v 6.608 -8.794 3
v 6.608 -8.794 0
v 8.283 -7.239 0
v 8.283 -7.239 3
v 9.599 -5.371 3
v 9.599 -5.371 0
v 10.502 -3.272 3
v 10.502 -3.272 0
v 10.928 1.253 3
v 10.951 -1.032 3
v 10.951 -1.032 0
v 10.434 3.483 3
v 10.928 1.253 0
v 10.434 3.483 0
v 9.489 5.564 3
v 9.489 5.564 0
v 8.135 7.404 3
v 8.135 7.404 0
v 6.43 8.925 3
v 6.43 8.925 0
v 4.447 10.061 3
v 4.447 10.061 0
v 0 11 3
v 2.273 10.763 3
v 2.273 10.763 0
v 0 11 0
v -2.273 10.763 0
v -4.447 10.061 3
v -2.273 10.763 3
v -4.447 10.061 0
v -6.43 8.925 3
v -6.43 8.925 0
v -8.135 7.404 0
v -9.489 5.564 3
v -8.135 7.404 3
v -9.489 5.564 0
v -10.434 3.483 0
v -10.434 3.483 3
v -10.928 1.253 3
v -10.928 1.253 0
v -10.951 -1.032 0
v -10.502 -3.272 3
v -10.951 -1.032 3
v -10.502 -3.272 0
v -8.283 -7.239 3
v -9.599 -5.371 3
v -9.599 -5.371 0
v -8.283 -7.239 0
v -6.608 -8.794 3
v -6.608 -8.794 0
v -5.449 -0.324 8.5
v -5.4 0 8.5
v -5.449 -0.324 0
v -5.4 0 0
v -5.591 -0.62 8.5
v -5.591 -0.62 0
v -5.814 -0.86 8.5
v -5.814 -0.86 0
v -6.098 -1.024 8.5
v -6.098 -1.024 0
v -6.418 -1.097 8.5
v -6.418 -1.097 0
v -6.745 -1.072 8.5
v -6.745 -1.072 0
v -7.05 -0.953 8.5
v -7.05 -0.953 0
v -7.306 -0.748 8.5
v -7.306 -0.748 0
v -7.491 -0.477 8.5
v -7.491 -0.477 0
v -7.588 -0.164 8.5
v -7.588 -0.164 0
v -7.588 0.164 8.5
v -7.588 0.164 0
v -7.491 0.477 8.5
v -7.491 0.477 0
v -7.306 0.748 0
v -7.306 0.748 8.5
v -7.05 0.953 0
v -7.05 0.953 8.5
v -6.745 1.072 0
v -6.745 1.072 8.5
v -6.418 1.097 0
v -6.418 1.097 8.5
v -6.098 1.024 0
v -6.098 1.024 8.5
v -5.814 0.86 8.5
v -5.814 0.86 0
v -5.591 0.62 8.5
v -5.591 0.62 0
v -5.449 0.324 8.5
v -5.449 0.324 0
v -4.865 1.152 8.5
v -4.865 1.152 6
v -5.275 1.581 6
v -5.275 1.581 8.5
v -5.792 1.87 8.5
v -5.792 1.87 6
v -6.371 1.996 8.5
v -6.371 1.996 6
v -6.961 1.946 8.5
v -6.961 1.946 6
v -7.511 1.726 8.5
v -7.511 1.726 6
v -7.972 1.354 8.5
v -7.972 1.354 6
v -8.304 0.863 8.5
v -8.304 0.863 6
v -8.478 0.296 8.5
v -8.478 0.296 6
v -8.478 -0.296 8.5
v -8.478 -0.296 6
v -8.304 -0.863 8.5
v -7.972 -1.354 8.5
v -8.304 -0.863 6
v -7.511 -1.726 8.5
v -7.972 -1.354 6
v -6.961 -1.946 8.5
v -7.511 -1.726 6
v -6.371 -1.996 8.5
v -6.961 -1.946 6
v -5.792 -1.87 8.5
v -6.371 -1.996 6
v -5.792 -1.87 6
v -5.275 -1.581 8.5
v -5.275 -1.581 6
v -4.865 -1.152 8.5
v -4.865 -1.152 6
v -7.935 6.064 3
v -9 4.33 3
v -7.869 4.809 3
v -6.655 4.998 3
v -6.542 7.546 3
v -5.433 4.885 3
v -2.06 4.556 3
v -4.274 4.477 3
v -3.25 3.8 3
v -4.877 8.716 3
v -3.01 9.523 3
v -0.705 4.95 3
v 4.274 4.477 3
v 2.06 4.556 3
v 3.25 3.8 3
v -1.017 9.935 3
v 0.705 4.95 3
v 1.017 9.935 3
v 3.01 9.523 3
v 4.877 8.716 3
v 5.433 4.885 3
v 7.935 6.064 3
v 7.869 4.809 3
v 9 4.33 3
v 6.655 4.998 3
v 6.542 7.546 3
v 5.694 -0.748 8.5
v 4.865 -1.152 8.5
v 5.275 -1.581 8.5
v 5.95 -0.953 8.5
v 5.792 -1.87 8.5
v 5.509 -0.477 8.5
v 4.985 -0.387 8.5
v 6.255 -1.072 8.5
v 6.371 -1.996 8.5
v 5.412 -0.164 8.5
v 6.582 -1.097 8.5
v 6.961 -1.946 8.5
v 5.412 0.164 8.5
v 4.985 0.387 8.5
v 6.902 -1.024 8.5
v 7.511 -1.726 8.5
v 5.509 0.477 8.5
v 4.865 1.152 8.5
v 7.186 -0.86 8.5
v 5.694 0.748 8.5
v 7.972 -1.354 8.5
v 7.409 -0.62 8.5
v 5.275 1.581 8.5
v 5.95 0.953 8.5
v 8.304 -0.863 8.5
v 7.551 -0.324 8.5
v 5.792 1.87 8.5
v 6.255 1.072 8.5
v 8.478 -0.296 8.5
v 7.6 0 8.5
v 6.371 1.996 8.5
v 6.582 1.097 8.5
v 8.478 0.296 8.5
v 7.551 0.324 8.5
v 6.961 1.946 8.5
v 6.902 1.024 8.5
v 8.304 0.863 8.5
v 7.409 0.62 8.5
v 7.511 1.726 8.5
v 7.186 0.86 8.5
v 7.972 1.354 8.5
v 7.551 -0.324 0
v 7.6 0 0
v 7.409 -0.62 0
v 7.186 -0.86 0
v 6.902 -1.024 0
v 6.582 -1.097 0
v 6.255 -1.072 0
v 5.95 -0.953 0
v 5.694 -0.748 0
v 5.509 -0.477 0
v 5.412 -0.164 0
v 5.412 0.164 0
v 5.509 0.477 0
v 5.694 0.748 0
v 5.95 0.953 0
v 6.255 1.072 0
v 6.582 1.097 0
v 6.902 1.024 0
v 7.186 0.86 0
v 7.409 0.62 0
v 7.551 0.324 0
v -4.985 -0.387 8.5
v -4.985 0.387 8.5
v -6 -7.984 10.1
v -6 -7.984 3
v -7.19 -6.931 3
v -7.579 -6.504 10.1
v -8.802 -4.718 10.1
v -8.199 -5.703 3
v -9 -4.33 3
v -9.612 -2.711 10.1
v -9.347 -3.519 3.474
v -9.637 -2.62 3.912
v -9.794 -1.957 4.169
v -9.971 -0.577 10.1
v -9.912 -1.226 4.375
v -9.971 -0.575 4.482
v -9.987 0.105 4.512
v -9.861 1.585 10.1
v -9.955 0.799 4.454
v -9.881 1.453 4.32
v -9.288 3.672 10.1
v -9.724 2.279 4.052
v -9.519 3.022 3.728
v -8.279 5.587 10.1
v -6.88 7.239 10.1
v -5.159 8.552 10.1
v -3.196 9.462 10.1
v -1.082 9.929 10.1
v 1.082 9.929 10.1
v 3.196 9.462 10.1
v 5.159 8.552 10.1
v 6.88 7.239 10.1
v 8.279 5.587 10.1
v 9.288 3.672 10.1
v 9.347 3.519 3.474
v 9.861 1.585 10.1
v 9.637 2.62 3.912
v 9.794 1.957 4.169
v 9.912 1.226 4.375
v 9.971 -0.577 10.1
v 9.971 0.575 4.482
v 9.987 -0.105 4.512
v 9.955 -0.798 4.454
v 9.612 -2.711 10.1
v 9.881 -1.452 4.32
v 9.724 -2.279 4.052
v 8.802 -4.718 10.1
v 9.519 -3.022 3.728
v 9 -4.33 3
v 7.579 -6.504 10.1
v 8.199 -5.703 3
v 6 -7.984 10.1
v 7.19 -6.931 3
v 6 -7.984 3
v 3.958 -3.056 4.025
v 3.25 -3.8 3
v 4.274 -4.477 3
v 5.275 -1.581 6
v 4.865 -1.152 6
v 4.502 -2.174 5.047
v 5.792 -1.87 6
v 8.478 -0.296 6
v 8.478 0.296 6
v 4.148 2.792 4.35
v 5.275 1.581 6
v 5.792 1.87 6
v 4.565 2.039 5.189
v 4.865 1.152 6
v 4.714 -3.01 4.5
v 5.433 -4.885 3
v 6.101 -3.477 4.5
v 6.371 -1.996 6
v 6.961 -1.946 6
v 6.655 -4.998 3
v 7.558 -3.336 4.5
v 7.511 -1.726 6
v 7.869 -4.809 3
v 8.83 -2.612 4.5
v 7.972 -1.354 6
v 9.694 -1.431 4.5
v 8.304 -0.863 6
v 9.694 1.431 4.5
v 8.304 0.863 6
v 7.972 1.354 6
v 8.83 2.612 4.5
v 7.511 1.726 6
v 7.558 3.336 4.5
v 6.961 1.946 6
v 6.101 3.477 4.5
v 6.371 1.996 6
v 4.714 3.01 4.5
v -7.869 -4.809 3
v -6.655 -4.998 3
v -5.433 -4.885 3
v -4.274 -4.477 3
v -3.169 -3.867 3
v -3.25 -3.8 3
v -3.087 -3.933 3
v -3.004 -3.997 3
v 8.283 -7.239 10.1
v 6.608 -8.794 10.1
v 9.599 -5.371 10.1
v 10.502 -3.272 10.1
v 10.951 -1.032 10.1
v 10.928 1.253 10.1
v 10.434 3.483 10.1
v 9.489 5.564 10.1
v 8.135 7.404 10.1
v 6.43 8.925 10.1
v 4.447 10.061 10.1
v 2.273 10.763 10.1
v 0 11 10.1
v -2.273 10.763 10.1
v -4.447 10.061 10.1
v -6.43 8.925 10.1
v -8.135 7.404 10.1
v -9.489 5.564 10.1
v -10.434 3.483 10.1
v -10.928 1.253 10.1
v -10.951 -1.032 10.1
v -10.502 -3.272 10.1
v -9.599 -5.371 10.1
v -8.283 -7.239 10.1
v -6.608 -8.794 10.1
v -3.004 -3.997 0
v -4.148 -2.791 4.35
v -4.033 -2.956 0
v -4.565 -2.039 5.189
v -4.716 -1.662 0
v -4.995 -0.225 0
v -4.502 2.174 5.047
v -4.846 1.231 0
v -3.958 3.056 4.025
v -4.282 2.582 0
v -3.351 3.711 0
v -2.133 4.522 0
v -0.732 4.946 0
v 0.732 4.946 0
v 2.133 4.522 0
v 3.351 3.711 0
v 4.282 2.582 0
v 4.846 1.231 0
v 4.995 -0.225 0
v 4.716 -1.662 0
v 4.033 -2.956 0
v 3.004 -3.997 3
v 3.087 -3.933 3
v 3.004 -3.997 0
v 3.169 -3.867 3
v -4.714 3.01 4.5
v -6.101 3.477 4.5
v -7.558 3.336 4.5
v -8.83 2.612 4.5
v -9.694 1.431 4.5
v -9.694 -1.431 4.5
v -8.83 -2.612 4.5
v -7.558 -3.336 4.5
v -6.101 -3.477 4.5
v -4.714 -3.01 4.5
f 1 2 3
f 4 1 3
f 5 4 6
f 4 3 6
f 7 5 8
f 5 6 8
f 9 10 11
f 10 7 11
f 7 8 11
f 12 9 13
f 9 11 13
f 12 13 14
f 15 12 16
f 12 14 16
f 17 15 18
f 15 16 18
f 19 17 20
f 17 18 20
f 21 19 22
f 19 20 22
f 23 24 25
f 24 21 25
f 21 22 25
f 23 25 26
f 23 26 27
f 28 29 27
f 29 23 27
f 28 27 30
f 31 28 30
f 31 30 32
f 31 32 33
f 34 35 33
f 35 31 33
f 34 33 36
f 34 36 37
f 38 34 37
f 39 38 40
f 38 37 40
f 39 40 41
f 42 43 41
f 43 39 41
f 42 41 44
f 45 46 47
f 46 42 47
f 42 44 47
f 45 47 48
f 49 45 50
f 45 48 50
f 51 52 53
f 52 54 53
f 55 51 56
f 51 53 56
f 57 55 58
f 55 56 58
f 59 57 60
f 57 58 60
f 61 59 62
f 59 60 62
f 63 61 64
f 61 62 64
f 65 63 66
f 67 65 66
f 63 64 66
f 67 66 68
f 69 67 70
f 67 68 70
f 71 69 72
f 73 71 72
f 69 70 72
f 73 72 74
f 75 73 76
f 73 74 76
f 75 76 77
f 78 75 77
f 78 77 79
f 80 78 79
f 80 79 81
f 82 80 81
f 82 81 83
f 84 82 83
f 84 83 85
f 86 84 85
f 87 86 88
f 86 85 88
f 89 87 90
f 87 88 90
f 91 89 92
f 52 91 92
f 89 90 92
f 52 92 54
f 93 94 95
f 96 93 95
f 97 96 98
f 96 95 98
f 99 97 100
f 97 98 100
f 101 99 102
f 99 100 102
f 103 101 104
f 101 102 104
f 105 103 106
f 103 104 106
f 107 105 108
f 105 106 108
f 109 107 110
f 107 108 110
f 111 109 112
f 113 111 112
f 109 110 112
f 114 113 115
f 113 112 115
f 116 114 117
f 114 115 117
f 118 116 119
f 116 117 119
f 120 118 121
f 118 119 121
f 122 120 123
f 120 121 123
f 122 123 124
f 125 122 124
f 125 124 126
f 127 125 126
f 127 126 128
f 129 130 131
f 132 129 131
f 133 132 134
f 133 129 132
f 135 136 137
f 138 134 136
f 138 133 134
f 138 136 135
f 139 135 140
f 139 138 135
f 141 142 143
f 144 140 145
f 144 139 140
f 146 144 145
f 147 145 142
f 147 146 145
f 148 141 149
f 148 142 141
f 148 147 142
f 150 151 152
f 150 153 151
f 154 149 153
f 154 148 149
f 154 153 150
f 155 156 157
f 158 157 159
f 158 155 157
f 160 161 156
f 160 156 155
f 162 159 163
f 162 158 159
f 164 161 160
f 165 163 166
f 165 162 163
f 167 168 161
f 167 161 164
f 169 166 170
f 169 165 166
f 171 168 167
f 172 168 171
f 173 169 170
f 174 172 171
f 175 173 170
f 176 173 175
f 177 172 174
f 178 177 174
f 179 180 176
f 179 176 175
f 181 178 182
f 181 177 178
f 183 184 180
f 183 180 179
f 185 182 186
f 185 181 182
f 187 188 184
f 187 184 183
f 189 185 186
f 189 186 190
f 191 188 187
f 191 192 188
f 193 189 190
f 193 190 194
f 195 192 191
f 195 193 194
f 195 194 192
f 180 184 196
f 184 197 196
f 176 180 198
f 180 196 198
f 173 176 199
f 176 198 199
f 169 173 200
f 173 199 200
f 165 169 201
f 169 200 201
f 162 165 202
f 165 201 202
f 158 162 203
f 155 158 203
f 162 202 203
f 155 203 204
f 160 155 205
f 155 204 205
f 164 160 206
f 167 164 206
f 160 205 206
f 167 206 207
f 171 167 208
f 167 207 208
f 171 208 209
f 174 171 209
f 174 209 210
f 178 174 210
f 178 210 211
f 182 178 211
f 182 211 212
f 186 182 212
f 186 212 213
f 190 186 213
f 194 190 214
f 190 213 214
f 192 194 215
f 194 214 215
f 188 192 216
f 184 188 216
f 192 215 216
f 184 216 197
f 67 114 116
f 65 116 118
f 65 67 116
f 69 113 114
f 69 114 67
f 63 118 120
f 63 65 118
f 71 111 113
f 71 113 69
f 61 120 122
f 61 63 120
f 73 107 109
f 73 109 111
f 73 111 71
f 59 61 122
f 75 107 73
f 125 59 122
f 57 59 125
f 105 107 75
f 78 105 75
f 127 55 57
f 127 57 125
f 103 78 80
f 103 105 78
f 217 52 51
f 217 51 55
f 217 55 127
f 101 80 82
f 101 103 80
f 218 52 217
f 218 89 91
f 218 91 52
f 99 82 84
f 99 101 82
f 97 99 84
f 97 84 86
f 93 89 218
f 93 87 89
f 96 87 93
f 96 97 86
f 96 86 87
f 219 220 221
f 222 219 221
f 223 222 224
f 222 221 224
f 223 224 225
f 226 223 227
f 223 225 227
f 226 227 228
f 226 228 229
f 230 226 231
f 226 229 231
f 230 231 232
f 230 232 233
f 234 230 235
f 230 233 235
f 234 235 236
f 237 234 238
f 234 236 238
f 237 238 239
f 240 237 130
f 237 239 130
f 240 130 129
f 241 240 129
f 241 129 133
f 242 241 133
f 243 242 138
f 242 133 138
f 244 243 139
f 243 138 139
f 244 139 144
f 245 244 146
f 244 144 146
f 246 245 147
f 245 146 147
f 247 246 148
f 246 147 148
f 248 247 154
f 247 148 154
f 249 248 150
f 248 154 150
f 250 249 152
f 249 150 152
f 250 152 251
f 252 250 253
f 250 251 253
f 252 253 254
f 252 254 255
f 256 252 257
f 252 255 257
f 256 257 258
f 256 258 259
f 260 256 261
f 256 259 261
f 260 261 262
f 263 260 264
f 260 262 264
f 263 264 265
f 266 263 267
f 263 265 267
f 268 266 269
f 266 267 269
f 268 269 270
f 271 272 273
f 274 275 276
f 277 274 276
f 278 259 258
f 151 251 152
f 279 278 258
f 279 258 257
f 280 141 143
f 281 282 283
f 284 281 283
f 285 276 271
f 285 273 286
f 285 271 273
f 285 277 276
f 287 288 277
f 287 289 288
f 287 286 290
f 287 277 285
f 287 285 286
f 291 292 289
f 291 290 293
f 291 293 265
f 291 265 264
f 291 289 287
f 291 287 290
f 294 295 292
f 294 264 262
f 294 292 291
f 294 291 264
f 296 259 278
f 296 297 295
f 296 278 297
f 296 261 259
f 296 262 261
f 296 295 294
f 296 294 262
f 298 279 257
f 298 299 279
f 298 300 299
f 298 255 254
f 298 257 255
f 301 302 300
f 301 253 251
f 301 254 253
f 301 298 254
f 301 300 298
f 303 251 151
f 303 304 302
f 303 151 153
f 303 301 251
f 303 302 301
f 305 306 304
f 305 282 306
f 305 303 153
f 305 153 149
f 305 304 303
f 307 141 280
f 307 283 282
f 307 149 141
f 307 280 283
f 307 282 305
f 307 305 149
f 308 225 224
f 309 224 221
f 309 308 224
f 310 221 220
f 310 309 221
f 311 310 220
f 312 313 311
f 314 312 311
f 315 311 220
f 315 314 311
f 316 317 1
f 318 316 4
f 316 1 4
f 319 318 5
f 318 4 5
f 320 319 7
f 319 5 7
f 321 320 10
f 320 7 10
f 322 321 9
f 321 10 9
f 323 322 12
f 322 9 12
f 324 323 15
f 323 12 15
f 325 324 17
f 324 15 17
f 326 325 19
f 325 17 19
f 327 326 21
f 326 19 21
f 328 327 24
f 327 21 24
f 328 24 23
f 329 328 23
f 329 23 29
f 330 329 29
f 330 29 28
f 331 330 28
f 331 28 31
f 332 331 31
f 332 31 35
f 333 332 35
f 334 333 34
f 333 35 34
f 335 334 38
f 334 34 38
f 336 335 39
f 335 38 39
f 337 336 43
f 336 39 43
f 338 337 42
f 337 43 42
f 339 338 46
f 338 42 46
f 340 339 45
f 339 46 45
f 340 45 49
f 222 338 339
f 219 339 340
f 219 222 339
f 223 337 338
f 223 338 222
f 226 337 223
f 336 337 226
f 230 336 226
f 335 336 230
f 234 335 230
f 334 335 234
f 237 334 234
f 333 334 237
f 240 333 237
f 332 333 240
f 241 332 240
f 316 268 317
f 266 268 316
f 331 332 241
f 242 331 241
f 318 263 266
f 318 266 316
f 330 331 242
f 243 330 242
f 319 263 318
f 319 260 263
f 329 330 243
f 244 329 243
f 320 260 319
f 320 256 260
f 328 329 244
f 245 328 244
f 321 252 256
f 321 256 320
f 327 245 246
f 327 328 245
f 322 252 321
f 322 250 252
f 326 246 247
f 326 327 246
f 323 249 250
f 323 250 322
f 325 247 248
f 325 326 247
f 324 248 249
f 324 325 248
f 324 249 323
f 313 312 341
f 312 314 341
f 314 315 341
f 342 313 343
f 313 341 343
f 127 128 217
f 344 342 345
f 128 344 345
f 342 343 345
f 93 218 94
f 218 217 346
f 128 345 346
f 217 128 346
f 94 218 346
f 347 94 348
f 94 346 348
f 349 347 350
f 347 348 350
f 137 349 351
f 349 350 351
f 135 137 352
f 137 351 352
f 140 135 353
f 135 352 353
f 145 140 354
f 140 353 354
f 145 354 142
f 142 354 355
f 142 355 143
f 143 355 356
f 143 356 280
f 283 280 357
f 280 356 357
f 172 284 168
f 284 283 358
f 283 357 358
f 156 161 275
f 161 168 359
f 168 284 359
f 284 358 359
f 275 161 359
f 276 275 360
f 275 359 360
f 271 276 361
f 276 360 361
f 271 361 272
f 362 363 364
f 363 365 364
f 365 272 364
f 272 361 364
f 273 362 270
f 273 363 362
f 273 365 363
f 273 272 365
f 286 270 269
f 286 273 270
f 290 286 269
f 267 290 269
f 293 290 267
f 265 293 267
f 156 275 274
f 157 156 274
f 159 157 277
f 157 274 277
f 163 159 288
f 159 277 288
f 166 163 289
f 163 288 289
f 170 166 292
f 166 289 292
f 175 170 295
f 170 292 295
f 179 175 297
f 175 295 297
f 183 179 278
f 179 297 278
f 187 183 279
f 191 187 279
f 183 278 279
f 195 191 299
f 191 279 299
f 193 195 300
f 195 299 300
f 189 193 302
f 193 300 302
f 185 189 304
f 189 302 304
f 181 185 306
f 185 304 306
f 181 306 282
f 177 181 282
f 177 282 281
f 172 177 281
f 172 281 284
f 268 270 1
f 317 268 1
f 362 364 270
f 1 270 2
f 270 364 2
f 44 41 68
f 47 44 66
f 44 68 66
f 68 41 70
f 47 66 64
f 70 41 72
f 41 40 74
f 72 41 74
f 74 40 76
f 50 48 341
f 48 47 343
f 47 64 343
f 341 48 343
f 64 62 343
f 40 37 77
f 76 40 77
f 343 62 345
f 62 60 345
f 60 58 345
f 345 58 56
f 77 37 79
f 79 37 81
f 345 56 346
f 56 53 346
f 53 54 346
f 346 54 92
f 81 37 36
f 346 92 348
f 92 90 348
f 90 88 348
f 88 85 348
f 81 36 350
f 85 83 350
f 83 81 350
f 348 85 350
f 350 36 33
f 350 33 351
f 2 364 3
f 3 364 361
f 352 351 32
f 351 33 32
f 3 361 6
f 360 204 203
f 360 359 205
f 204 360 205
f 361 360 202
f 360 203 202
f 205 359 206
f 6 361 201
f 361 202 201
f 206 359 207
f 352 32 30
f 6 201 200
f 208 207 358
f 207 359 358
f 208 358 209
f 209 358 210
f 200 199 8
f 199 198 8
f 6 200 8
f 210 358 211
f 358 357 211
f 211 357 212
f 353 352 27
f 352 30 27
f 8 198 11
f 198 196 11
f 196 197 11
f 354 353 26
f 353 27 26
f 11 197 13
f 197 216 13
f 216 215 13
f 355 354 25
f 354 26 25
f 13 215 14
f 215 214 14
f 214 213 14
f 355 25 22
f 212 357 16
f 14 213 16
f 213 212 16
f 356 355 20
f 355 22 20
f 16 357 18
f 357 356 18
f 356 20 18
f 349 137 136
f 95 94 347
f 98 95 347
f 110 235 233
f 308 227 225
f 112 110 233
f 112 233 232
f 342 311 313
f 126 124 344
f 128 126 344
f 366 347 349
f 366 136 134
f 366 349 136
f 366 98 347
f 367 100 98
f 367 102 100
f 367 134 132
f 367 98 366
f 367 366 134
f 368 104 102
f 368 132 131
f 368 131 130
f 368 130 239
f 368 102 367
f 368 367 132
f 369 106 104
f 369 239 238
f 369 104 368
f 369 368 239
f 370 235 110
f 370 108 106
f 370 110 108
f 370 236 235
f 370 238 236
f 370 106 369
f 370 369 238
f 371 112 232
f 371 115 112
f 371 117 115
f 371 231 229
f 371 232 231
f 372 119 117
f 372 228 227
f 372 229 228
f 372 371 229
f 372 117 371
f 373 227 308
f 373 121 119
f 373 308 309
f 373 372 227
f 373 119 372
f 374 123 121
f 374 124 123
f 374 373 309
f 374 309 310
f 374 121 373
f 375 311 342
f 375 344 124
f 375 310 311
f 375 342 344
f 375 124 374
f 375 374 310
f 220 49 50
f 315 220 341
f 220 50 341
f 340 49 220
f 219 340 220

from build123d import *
from build123d.topology import SkipClean

# Parameters (mm, degrees)
SKETCH_1_R          = 11
SKETCH_1_R_2        = 5
SKETCH_1_R_3        = 1.1
EXTRUDE_1_DEPTH     = 3
EXTRUDE_2_DEPTH     = 5.5
EXTRUDE_3_DEPTH     = 7.1
CHAMFER_1_SIZE      = 3
CUT_EXTRUDE_1_DEPTH = 10
CUT_EXTRUDE_2_REACH = 19.1
SKETCH_5_R          = 1.1


with BuildPart() as part:
    # 草图1 → 凸台-拉伸1 (new body)
    with BuildSketch(Plane.XY):
        Circle(SKETCH_1_R)
        Circle(SKETCH_1_R_2, mode=Mode.SUBTRACT)
        with Locations((-6.5, 0)):
            Circle(SKETCH_1_R_3, mode=Mode.SUBTRACT)
        with Locations((6.5, 0)):
            Circle(SKETCH_1_R_3, mode=Mode.SUBTRACT)
    extrude(amount=EXTRUDE_1_DEPTH)

    # 草图2 → 凸台-拉伸2 (add)
    with SkipClean():  # the faces are left unmerged after this step: merging them gives an invalid solid
        with BuildSketch(Plane.XY.offset(3)):
            with BuildLine():
                ThreePointArc((4.865384615, -1.152402944), (8.5, 0), (4.865384615, 1.152402944))
                ThreePointArc((4.865384615, 1.152402944), (5, 0), (4.865384615, -1.152402944))
            make_face()
            with BuildLine():
                ThreePointArc((-4.865384615, 1.152402944), (-8.5, 0), (-4.865384615, -1.152402944))
                ThreePointArc((-4.865384615, -1.152402944), (-5, 0), (-4.865384615, 1.152402944))
            make_face()
        extrude(amount=EXTRUDE_2_DEPTH)

    # 草图3 → 凸台-拉伸3 (add)
    with SkipClean():  # the faces are left unmerged after this step: merging them gives an invalid solid
        with BuildSketch(Plane.XY.offset(3)):
            with BuildLine():
                Line((-6.60837923, -8.79370934), (-6, -7.984144705))
                ThreePointArc((-6, -7.984144705), (0, 9.987320295), (6, -7.984144705))
                Line((6, -7.984144705), (6.60837923, -8.79370934))
                ThreePointArc((6.60837923, -8.79370934), (0, 11), (-6.60837923, -8.79370934))
            make_face()
        extrude(amount=EXTRUDE_3_DEPTH)

    # 倒角1
    # the kernel refuses this chamfer: 3 mm, written as the material it adds along each edge
    with BuildSketch(Plane(origin=(6.5, 0, 3), x_dir=(-0.9999950652018583, -0.0031415874858795587, 0), z_dir=(-0.0031415874858795587, 0.9999950652018583, 0))) as chamfer_1_piece_1_section:
        Polygon((2 + CHAMFER_1_SIZE, 0), (2, CHAMFER_1_SIZE), (2, 0), align=None)
    chamfer_1_piece_1 = revolve(axis=Axis((6.5, 0, 3), (0, 0, 1)), revolution_arc=359.64, mode=Mode.PRIVATE)
    chamfer_1_piece_1 = chamfer_1_piece_1 - Plane(origin=(0, 0, 3.47273438), x_dir=(1, 0, 0), z_dir=(0, 0, -1)) * Cylinder(5, 21, mode=Mode.PRIVATE)
    chamfer_1_piece_1 = chamfer_1_piece_1 & Plane(origin=(0, 0, 3.47273438), x_dir=(-0.6007617481958082, -0.7994281217875167, 0), z_dir=(0, 0, -1)) * Cylinder(9.987320295, 21, mode=Mode.PRIVATE)
    add(chamfer_1_piece_1)
    with BuildSketch(Plane(origin=(-6.5, 0, 3), x_dir=(0.9999950652018583, 0.0031415874858795045, 0), z_dir=(0.0031415874858795045, -0.9999950652018583, 0))) as chamfer_1_piece_2_section:
        Polygon((2 + CHAMFER_1_SIZE, 0), (2, CHAMFER_1_SIZE), (2, 0), align=None)
    chamfer_1_piece_2 = revolve(axis=Axis((-6.5, 0, 3), (0, 0, 1)), revolution_arc=359.64, mode=Mode.PRIVATE)
    chamfer_1_piece_2 = chamfer_1_piece_2 - Plane(origin=(0, 0, 3.472734386), x_dir=(1, 0, 0), z_dir=(0, 0, -1)) * Cylinder(5, 21, mode=Mode.PRIVATE)
    chamfer_1_piece_2 = chamfer_1_piece_2 & Plane(origin=(0, 0, 3.472734386), x_dir=(-0.6007617481958082, -0.7994281217875167, 0), z_dir=(0, 0, -1)) * Cylinder(9.987320295, 21, mode=Mode.PRIVATE)
    add(chamfer_1_piece_2)

    # 草图4 → 切除-拉伸1 (cut)
    with BuildSketch(Plane(origin=(0, 0, 0), x_dir=(-1, 0, 0), z_dir=(0, 0, -1))):
        with BuildLine():
            ThreePointArc((-6.60837923, -8.79370934), (0, -11), (6.60837923, -8.79370934))
            Line((6.60837923, -8.79370934), (3.003808741, -3.997140609))
            ThreePointArc((3.003808741, -3.997140609), (0, -5), (-3.003808741, -3.997140609))
            Line((-3.003808741, -3.997140609), (-6.60837923, -8.79370934))
        make_face()
    extrude(amount=-CUT_EXTRUDE_1_DEPTH, mode=Mode.SUBTRACT)

    # 草图5 → 切除-拉伸2 (cut, up to next)
    with BuildSketch(Plane(origin=(0, 0, 3), x_dir=(-1, 0, 0), z_dir=(0, 0, -1)), mode=Mode.PRIVATE) as cut_extrude_2_sk1:
        with Locations(Location((6.5, 0, 0), (0, 0, 180))):
            Circle(SKETCH_5_R)
    cut_extrude_2_tool1 = extrude(cut_extrude_2_sk1.sketch, amount=-CUT_EXTRUDE_2_REACH, mode=Mode.PRIVATE) & part.part
    # 草图5 → 切除-拉伸2 (cut, up to next)
    with BuildSketch(Plane(origin=(0, 0, 3), x_dir=(-1, 0, 0), z_dir=(0, 0, -1)), mode=Mode.PRIVATE) as cut_extrude_2_sk2:
        with Locations(Location((-6.5, 0, 0), (0, 0, 180))):
            Circle(SKETCH_5_R)
    cut_extrude_2_tool2 = extrude(cut_extrude_2_sk2.sketch, amount=-CUT_EXTRUDE_2_REACH, mode=Mode.PRIVATE) & part.part
    add(cut_extrude_2_tool1.solids().sort_by_distance((-6.5, 0, 3))[0], mode=Mode.SUBTRACT)
    add(cut_extrude_2_tool2.solids().sort_by_distance((6.5, 0, 3))[0], mode=Mode.SUBTRACT)


solid = part.part
